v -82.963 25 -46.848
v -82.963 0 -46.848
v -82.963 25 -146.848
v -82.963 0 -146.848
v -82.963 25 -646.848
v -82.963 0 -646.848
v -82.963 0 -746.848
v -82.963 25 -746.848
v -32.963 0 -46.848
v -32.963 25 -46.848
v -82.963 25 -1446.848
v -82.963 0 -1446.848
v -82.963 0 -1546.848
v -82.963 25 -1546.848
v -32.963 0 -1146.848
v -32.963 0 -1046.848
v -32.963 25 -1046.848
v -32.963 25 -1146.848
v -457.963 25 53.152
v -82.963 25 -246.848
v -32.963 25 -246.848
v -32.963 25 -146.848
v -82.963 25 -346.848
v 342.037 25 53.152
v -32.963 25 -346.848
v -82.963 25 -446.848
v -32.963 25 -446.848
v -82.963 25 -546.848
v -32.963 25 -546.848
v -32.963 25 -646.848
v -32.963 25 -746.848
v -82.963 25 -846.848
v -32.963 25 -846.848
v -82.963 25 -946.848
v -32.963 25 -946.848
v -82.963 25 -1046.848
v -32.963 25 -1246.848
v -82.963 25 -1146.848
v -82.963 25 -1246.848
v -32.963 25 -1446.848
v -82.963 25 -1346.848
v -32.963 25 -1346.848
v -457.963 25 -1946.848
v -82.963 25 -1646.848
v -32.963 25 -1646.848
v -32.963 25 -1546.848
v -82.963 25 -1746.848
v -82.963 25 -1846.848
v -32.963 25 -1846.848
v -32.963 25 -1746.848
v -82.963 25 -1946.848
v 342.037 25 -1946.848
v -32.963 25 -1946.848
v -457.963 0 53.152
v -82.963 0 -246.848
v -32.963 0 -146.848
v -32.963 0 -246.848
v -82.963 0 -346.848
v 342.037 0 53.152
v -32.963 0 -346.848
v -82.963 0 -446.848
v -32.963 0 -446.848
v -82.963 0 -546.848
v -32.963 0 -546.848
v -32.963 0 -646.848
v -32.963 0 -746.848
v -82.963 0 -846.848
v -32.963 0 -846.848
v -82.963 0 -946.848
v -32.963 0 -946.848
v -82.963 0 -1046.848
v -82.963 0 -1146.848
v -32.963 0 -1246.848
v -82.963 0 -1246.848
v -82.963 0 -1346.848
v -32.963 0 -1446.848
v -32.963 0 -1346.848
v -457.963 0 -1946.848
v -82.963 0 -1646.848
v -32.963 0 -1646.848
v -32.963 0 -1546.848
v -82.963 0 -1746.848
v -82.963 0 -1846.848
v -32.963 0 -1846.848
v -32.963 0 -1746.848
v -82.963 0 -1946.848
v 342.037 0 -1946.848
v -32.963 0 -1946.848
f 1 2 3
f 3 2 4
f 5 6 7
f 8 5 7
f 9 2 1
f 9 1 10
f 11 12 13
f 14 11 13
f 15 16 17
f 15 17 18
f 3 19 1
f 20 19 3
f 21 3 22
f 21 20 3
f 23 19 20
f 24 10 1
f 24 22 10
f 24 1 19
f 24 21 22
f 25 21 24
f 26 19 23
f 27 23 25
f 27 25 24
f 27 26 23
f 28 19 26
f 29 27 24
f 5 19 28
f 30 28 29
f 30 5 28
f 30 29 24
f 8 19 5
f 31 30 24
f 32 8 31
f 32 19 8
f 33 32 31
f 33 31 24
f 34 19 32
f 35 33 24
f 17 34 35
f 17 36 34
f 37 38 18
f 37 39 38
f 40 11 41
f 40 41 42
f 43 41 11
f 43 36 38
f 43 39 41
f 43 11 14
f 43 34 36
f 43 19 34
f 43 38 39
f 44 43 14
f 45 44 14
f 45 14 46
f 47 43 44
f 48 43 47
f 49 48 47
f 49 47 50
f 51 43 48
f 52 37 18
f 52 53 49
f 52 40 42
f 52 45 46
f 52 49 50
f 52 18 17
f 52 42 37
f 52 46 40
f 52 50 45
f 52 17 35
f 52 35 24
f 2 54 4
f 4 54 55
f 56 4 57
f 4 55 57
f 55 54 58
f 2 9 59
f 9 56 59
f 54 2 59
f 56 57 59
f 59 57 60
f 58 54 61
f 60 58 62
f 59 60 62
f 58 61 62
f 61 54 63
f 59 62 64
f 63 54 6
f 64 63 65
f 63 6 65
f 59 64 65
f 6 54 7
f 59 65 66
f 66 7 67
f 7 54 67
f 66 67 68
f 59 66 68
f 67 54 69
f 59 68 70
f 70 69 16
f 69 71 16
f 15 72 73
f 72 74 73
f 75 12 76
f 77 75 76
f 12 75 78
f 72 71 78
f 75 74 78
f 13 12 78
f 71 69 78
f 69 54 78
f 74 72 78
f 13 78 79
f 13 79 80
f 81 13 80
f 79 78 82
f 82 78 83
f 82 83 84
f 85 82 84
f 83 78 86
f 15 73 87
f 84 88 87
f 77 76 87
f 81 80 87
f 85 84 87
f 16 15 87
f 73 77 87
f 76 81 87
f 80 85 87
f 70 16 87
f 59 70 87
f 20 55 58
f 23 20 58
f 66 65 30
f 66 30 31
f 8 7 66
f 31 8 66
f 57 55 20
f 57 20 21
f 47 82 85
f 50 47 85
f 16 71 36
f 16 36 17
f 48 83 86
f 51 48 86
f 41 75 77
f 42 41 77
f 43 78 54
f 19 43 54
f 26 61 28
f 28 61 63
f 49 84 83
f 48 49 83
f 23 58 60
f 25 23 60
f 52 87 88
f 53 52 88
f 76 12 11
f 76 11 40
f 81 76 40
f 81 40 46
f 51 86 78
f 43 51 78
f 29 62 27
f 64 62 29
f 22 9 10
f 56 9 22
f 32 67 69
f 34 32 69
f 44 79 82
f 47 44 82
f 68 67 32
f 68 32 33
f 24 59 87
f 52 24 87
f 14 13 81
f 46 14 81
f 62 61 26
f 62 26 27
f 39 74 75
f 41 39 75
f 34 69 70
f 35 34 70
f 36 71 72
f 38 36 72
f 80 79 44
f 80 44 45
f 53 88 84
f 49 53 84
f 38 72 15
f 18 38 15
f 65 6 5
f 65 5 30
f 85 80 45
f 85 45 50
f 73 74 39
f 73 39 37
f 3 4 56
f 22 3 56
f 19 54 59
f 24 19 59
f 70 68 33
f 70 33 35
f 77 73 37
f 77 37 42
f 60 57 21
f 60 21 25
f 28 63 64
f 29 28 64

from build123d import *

# Parameters (mm, degrees)
SKETCH1_W           = 50
SKETCH1_H           = 100
BOSS_EXTRUDE1_DEPTH = 25


with BuildPart() as part:
    # Sketch1 → Boss-Extrude1 (new body)
    with BuildSketch(Plane(origin=(0, 0, 0), x_dir=(1, 0, 0), z_dir=(0, 1, 0))):
        Polygon((-457.962648343, 1946.847529943), (-457.962648343, -53.152470057), (342.037351657, -53.152470057), (342.037351657, 1946.847529943), (-32.962648343, 1946.847529943), (-32.962648343, 1846.847529943), (-82.962648343, 1846.847529943), (-82.962648343, 1946.847529943), align=None)
        with Locations((-57.962648343, 1696.847529943)):
            Rectangle(SKETCH1_W, SKETCH1_H, mode=Mode.SUBTRACT)
        with Locations((-57.962648343, 1496.847529943)):
            Rectangle(SKETCH1_W, SKETCH1_H, mode=Mode.SUBTRACT)
        with Locations((-57.962648343, 1296.847529943)):
            Rectangle(SKETCH1_W, SKETCH1_H, mode=Mode.SUBTRACT)
        with Locations((-57.962648343, 1096.847529943)):
            Rectangle(SKETCH1_W, SKETCH1_H, mode=Mode.SUBTRACT)
        with Locations((-57.962648343, 896.847529943)):
            Rectangle(SKETCH1_W, SKETCH1_H, mode=Mode.SUBTRACT)
        with Locations((-57.962648343, 696.847529943)):
            Rectangle(SKETCH1_W, SKETCH1_H, mode=Mode.SUBTRACT)
        with Locations((-57.962648343, 496.847529943)):
            Rectangle(SKETCH1_W, SKETCH1_H, mode=Mode.SUBTRACT)
        with Locations((-57.962648343, 296.847529943)):
            Rectangle(SKETCH1_W, SKETCH1_H, mode=Mode.SUBTRACT)
        with Locations((-57.962648343, 96.847529943)):
            Rectangle(SKETCH1_W, SKETCH1_H, mode=Mode.SUBTRACT)
    extrude(amount=BOSS_EXTRUDE1_DEPTH)


solid = part.part
